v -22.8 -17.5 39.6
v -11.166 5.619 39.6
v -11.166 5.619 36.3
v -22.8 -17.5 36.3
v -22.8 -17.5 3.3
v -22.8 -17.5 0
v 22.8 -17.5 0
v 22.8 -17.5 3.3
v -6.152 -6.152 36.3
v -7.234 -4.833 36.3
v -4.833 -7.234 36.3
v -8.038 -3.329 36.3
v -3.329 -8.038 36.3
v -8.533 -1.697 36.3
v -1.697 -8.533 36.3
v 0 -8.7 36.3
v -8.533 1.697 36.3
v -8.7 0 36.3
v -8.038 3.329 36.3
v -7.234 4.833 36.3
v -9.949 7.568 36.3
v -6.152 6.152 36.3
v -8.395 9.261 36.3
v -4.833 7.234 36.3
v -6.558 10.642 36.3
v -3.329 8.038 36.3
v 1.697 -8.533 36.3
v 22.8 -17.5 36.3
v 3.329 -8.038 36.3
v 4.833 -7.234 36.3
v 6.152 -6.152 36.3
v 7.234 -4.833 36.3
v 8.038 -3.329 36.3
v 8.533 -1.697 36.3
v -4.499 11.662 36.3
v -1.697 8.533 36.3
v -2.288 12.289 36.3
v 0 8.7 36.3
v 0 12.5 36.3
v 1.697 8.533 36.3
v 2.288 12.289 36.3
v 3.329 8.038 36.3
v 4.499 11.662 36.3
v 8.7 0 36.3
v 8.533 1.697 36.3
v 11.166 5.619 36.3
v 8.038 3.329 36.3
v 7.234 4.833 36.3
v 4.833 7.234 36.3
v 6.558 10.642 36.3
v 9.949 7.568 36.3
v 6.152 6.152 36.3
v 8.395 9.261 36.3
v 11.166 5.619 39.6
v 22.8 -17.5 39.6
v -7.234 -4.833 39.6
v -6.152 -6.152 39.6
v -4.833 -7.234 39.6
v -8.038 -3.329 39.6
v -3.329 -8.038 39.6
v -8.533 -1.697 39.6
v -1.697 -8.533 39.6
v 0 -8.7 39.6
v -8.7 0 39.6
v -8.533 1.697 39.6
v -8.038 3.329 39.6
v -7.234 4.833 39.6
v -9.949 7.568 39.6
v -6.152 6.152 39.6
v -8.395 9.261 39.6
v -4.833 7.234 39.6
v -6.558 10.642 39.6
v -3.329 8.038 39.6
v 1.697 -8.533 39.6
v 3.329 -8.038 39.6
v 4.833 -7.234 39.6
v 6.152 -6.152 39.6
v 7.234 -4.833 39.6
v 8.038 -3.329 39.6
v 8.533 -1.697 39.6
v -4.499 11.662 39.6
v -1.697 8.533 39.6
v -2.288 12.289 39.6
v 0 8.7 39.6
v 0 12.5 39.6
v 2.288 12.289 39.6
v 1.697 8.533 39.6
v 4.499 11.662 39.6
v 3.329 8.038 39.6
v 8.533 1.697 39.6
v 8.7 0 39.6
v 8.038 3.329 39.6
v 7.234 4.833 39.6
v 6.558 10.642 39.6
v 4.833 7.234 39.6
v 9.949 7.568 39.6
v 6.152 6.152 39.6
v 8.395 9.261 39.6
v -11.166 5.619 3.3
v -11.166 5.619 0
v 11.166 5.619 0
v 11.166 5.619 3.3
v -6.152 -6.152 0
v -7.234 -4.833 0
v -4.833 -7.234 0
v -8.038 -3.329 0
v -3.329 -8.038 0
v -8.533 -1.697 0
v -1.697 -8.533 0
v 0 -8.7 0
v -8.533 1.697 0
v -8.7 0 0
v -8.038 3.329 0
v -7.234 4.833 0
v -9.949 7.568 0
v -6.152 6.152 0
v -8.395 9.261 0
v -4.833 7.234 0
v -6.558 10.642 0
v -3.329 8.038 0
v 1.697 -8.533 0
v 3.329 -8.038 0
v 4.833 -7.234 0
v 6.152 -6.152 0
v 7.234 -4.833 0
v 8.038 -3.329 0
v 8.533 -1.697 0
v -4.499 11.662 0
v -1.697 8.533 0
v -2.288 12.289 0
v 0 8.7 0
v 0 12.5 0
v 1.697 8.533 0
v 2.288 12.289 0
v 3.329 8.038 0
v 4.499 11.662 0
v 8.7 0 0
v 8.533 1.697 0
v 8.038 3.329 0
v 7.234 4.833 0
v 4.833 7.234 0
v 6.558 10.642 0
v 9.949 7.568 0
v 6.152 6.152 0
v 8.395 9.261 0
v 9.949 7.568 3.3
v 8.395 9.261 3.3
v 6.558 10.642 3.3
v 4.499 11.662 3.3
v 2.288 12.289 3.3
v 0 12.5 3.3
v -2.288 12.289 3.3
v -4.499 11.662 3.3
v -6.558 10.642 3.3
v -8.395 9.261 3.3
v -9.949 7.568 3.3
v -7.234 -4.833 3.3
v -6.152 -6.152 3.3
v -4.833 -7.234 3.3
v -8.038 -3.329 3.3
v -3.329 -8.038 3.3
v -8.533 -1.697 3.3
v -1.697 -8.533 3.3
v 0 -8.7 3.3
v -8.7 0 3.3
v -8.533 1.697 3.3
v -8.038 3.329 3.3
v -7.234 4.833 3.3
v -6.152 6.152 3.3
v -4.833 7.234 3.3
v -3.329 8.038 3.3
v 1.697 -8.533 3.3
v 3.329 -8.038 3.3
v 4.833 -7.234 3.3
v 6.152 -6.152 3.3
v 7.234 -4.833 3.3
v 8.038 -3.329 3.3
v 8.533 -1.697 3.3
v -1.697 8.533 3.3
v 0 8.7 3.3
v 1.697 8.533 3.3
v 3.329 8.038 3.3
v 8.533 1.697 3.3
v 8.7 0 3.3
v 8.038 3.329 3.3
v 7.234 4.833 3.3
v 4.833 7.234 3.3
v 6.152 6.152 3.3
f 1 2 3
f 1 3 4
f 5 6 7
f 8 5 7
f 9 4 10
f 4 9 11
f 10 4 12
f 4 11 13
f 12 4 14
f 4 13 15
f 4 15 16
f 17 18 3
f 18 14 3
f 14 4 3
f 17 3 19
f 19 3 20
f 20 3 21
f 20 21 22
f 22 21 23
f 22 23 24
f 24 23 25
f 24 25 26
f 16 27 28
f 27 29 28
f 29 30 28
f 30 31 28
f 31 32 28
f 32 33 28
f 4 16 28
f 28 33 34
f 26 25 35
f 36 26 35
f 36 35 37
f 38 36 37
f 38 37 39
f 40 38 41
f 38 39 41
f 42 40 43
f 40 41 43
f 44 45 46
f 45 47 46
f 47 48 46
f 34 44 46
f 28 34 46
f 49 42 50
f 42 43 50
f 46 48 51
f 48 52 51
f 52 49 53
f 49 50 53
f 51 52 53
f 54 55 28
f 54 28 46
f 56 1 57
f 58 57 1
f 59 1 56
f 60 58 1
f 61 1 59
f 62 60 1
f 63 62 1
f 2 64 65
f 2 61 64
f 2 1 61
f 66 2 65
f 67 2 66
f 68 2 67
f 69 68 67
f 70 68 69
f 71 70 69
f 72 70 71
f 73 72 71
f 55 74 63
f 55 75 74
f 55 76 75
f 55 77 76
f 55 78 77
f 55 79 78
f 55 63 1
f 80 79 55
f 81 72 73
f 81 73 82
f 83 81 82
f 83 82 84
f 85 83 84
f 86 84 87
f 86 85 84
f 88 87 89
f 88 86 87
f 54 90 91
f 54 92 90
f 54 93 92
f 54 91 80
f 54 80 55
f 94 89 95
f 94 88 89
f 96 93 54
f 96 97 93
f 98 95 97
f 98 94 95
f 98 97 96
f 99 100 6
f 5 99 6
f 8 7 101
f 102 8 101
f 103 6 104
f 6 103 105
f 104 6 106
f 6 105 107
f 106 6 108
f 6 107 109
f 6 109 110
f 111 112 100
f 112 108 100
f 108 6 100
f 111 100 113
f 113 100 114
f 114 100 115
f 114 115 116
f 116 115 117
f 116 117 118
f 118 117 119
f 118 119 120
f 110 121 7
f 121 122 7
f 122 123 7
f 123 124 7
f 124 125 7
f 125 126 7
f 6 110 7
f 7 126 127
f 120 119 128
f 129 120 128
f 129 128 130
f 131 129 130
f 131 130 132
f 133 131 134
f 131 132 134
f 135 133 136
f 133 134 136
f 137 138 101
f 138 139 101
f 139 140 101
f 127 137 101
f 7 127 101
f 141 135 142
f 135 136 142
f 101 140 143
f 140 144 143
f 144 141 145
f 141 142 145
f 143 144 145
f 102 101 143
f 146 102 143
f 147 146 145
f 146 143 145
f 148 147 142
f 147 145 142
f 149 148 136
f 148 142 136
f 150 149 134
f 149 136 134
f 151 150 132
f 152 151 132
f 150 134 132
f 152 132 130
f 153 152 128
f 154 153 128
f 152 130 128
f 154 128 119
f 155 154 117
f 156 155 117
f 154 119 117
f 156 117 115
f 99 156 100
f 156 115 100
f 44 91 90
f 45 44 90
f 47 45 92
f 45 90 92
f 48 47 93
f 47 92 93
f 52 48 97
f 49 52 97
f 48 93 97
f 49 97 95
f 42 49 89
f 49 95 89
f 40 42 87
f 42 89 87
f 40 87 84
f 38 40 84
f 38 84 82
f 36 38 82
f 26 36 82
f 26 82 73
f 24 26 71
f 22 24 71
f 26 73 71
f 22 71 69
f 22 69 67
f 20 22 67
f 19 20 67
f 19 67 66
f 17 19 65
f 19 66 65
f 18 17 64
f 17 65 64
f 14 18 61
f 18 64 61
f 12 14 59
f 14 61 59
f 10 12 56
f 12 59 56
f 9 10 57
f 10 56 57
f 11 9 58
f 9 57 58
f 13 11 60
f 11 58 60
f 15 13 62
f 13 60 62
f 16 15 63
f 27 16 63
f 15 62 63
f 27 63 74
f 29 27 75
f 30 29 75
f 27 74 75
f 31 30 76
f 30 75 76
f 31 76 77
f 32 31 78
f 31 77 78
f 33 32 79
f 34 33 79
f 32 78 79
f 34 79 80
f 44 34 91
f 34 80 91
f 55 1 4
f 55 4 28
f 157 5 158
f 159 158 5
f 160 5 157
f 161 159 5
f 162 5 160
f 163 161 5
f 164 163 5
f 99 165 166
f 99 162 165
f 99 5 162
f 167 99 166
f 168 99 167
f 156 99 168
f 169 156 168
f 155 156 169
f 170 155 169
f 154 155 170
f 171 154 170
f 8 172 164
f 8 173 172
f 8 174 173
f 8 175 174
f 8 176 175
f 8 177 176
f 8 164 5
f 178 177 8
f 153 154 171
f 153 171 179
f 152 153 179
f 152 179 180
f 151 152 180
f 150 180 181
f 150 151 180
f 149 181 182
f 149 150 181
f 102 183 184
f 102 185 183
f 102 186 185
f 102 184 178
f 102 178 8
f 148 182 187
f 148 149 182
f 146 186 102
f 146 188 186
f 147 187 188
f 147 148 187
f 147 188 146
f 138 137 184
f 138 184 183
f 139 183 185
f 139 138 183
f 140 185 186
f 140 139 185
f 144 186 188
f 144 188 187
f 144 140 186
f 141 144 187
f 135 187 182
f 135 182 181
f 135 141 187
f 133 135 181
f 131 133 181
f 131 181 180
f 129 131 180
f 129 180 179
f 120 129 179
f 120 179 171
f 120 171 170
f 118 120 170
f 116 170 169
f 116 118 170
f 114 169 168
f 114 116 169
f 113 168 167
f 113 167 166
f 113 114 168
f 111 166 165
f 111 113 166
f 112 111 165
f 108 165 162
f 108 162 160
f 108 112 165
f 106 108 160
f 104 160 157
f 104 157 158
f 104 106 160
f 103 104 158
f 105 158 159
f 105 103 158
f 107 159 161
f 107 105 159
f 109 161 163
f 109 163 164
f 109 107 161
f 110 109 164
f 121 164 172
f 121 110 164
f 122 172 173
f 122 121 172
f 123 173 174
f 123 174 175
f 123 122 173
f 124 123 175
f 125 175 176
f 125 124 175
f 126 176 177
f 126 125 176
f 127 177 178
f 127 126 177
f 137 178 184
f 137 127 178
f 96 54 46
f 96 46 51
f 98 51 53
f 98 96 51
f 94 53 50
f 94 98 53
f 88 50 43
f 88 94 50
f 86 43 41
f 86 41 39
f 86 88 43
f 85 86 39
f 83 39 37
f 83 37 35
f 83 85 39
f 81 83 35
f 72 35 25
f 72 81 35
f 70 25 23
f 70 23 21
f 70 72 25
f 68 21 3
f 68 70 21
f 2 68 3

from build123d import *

# Parameters (mm, degrees)
SKETCH1_R           = 8.7
BOSS_EXTRUDE1_DEPTH = 3.3


with BuildPart() as part:
    # Sketch1 → Boss-Extrude1 (new body)
    with BuildSketch(Plane.XY):
        with BuildLine():
            Line((-22.8, -17.5), (22.8, -17.5))
            Line((22.8, -17.5), (11.165886567, 5.618983642))
            ThreePointArc((11.165886567, 5.618983642), (0, 12.5), (-11.165886567, 5.618983642))
            Line((-11.165886567, 5.618983642), (-22.8, -17.5))
        make_face()
        Circle(SKETCH1_R, mode=Mode.SUBTRACT)
    extrude(amount=BOSS_EXTRUDE1_DEPTH)


with BuildPart() as body_2:
    # Mirror6: mirrored copy
    add(part.part.mirror(Plane.XY.offset(19.8)))


solid = Compound([part.part, body_2.part])
